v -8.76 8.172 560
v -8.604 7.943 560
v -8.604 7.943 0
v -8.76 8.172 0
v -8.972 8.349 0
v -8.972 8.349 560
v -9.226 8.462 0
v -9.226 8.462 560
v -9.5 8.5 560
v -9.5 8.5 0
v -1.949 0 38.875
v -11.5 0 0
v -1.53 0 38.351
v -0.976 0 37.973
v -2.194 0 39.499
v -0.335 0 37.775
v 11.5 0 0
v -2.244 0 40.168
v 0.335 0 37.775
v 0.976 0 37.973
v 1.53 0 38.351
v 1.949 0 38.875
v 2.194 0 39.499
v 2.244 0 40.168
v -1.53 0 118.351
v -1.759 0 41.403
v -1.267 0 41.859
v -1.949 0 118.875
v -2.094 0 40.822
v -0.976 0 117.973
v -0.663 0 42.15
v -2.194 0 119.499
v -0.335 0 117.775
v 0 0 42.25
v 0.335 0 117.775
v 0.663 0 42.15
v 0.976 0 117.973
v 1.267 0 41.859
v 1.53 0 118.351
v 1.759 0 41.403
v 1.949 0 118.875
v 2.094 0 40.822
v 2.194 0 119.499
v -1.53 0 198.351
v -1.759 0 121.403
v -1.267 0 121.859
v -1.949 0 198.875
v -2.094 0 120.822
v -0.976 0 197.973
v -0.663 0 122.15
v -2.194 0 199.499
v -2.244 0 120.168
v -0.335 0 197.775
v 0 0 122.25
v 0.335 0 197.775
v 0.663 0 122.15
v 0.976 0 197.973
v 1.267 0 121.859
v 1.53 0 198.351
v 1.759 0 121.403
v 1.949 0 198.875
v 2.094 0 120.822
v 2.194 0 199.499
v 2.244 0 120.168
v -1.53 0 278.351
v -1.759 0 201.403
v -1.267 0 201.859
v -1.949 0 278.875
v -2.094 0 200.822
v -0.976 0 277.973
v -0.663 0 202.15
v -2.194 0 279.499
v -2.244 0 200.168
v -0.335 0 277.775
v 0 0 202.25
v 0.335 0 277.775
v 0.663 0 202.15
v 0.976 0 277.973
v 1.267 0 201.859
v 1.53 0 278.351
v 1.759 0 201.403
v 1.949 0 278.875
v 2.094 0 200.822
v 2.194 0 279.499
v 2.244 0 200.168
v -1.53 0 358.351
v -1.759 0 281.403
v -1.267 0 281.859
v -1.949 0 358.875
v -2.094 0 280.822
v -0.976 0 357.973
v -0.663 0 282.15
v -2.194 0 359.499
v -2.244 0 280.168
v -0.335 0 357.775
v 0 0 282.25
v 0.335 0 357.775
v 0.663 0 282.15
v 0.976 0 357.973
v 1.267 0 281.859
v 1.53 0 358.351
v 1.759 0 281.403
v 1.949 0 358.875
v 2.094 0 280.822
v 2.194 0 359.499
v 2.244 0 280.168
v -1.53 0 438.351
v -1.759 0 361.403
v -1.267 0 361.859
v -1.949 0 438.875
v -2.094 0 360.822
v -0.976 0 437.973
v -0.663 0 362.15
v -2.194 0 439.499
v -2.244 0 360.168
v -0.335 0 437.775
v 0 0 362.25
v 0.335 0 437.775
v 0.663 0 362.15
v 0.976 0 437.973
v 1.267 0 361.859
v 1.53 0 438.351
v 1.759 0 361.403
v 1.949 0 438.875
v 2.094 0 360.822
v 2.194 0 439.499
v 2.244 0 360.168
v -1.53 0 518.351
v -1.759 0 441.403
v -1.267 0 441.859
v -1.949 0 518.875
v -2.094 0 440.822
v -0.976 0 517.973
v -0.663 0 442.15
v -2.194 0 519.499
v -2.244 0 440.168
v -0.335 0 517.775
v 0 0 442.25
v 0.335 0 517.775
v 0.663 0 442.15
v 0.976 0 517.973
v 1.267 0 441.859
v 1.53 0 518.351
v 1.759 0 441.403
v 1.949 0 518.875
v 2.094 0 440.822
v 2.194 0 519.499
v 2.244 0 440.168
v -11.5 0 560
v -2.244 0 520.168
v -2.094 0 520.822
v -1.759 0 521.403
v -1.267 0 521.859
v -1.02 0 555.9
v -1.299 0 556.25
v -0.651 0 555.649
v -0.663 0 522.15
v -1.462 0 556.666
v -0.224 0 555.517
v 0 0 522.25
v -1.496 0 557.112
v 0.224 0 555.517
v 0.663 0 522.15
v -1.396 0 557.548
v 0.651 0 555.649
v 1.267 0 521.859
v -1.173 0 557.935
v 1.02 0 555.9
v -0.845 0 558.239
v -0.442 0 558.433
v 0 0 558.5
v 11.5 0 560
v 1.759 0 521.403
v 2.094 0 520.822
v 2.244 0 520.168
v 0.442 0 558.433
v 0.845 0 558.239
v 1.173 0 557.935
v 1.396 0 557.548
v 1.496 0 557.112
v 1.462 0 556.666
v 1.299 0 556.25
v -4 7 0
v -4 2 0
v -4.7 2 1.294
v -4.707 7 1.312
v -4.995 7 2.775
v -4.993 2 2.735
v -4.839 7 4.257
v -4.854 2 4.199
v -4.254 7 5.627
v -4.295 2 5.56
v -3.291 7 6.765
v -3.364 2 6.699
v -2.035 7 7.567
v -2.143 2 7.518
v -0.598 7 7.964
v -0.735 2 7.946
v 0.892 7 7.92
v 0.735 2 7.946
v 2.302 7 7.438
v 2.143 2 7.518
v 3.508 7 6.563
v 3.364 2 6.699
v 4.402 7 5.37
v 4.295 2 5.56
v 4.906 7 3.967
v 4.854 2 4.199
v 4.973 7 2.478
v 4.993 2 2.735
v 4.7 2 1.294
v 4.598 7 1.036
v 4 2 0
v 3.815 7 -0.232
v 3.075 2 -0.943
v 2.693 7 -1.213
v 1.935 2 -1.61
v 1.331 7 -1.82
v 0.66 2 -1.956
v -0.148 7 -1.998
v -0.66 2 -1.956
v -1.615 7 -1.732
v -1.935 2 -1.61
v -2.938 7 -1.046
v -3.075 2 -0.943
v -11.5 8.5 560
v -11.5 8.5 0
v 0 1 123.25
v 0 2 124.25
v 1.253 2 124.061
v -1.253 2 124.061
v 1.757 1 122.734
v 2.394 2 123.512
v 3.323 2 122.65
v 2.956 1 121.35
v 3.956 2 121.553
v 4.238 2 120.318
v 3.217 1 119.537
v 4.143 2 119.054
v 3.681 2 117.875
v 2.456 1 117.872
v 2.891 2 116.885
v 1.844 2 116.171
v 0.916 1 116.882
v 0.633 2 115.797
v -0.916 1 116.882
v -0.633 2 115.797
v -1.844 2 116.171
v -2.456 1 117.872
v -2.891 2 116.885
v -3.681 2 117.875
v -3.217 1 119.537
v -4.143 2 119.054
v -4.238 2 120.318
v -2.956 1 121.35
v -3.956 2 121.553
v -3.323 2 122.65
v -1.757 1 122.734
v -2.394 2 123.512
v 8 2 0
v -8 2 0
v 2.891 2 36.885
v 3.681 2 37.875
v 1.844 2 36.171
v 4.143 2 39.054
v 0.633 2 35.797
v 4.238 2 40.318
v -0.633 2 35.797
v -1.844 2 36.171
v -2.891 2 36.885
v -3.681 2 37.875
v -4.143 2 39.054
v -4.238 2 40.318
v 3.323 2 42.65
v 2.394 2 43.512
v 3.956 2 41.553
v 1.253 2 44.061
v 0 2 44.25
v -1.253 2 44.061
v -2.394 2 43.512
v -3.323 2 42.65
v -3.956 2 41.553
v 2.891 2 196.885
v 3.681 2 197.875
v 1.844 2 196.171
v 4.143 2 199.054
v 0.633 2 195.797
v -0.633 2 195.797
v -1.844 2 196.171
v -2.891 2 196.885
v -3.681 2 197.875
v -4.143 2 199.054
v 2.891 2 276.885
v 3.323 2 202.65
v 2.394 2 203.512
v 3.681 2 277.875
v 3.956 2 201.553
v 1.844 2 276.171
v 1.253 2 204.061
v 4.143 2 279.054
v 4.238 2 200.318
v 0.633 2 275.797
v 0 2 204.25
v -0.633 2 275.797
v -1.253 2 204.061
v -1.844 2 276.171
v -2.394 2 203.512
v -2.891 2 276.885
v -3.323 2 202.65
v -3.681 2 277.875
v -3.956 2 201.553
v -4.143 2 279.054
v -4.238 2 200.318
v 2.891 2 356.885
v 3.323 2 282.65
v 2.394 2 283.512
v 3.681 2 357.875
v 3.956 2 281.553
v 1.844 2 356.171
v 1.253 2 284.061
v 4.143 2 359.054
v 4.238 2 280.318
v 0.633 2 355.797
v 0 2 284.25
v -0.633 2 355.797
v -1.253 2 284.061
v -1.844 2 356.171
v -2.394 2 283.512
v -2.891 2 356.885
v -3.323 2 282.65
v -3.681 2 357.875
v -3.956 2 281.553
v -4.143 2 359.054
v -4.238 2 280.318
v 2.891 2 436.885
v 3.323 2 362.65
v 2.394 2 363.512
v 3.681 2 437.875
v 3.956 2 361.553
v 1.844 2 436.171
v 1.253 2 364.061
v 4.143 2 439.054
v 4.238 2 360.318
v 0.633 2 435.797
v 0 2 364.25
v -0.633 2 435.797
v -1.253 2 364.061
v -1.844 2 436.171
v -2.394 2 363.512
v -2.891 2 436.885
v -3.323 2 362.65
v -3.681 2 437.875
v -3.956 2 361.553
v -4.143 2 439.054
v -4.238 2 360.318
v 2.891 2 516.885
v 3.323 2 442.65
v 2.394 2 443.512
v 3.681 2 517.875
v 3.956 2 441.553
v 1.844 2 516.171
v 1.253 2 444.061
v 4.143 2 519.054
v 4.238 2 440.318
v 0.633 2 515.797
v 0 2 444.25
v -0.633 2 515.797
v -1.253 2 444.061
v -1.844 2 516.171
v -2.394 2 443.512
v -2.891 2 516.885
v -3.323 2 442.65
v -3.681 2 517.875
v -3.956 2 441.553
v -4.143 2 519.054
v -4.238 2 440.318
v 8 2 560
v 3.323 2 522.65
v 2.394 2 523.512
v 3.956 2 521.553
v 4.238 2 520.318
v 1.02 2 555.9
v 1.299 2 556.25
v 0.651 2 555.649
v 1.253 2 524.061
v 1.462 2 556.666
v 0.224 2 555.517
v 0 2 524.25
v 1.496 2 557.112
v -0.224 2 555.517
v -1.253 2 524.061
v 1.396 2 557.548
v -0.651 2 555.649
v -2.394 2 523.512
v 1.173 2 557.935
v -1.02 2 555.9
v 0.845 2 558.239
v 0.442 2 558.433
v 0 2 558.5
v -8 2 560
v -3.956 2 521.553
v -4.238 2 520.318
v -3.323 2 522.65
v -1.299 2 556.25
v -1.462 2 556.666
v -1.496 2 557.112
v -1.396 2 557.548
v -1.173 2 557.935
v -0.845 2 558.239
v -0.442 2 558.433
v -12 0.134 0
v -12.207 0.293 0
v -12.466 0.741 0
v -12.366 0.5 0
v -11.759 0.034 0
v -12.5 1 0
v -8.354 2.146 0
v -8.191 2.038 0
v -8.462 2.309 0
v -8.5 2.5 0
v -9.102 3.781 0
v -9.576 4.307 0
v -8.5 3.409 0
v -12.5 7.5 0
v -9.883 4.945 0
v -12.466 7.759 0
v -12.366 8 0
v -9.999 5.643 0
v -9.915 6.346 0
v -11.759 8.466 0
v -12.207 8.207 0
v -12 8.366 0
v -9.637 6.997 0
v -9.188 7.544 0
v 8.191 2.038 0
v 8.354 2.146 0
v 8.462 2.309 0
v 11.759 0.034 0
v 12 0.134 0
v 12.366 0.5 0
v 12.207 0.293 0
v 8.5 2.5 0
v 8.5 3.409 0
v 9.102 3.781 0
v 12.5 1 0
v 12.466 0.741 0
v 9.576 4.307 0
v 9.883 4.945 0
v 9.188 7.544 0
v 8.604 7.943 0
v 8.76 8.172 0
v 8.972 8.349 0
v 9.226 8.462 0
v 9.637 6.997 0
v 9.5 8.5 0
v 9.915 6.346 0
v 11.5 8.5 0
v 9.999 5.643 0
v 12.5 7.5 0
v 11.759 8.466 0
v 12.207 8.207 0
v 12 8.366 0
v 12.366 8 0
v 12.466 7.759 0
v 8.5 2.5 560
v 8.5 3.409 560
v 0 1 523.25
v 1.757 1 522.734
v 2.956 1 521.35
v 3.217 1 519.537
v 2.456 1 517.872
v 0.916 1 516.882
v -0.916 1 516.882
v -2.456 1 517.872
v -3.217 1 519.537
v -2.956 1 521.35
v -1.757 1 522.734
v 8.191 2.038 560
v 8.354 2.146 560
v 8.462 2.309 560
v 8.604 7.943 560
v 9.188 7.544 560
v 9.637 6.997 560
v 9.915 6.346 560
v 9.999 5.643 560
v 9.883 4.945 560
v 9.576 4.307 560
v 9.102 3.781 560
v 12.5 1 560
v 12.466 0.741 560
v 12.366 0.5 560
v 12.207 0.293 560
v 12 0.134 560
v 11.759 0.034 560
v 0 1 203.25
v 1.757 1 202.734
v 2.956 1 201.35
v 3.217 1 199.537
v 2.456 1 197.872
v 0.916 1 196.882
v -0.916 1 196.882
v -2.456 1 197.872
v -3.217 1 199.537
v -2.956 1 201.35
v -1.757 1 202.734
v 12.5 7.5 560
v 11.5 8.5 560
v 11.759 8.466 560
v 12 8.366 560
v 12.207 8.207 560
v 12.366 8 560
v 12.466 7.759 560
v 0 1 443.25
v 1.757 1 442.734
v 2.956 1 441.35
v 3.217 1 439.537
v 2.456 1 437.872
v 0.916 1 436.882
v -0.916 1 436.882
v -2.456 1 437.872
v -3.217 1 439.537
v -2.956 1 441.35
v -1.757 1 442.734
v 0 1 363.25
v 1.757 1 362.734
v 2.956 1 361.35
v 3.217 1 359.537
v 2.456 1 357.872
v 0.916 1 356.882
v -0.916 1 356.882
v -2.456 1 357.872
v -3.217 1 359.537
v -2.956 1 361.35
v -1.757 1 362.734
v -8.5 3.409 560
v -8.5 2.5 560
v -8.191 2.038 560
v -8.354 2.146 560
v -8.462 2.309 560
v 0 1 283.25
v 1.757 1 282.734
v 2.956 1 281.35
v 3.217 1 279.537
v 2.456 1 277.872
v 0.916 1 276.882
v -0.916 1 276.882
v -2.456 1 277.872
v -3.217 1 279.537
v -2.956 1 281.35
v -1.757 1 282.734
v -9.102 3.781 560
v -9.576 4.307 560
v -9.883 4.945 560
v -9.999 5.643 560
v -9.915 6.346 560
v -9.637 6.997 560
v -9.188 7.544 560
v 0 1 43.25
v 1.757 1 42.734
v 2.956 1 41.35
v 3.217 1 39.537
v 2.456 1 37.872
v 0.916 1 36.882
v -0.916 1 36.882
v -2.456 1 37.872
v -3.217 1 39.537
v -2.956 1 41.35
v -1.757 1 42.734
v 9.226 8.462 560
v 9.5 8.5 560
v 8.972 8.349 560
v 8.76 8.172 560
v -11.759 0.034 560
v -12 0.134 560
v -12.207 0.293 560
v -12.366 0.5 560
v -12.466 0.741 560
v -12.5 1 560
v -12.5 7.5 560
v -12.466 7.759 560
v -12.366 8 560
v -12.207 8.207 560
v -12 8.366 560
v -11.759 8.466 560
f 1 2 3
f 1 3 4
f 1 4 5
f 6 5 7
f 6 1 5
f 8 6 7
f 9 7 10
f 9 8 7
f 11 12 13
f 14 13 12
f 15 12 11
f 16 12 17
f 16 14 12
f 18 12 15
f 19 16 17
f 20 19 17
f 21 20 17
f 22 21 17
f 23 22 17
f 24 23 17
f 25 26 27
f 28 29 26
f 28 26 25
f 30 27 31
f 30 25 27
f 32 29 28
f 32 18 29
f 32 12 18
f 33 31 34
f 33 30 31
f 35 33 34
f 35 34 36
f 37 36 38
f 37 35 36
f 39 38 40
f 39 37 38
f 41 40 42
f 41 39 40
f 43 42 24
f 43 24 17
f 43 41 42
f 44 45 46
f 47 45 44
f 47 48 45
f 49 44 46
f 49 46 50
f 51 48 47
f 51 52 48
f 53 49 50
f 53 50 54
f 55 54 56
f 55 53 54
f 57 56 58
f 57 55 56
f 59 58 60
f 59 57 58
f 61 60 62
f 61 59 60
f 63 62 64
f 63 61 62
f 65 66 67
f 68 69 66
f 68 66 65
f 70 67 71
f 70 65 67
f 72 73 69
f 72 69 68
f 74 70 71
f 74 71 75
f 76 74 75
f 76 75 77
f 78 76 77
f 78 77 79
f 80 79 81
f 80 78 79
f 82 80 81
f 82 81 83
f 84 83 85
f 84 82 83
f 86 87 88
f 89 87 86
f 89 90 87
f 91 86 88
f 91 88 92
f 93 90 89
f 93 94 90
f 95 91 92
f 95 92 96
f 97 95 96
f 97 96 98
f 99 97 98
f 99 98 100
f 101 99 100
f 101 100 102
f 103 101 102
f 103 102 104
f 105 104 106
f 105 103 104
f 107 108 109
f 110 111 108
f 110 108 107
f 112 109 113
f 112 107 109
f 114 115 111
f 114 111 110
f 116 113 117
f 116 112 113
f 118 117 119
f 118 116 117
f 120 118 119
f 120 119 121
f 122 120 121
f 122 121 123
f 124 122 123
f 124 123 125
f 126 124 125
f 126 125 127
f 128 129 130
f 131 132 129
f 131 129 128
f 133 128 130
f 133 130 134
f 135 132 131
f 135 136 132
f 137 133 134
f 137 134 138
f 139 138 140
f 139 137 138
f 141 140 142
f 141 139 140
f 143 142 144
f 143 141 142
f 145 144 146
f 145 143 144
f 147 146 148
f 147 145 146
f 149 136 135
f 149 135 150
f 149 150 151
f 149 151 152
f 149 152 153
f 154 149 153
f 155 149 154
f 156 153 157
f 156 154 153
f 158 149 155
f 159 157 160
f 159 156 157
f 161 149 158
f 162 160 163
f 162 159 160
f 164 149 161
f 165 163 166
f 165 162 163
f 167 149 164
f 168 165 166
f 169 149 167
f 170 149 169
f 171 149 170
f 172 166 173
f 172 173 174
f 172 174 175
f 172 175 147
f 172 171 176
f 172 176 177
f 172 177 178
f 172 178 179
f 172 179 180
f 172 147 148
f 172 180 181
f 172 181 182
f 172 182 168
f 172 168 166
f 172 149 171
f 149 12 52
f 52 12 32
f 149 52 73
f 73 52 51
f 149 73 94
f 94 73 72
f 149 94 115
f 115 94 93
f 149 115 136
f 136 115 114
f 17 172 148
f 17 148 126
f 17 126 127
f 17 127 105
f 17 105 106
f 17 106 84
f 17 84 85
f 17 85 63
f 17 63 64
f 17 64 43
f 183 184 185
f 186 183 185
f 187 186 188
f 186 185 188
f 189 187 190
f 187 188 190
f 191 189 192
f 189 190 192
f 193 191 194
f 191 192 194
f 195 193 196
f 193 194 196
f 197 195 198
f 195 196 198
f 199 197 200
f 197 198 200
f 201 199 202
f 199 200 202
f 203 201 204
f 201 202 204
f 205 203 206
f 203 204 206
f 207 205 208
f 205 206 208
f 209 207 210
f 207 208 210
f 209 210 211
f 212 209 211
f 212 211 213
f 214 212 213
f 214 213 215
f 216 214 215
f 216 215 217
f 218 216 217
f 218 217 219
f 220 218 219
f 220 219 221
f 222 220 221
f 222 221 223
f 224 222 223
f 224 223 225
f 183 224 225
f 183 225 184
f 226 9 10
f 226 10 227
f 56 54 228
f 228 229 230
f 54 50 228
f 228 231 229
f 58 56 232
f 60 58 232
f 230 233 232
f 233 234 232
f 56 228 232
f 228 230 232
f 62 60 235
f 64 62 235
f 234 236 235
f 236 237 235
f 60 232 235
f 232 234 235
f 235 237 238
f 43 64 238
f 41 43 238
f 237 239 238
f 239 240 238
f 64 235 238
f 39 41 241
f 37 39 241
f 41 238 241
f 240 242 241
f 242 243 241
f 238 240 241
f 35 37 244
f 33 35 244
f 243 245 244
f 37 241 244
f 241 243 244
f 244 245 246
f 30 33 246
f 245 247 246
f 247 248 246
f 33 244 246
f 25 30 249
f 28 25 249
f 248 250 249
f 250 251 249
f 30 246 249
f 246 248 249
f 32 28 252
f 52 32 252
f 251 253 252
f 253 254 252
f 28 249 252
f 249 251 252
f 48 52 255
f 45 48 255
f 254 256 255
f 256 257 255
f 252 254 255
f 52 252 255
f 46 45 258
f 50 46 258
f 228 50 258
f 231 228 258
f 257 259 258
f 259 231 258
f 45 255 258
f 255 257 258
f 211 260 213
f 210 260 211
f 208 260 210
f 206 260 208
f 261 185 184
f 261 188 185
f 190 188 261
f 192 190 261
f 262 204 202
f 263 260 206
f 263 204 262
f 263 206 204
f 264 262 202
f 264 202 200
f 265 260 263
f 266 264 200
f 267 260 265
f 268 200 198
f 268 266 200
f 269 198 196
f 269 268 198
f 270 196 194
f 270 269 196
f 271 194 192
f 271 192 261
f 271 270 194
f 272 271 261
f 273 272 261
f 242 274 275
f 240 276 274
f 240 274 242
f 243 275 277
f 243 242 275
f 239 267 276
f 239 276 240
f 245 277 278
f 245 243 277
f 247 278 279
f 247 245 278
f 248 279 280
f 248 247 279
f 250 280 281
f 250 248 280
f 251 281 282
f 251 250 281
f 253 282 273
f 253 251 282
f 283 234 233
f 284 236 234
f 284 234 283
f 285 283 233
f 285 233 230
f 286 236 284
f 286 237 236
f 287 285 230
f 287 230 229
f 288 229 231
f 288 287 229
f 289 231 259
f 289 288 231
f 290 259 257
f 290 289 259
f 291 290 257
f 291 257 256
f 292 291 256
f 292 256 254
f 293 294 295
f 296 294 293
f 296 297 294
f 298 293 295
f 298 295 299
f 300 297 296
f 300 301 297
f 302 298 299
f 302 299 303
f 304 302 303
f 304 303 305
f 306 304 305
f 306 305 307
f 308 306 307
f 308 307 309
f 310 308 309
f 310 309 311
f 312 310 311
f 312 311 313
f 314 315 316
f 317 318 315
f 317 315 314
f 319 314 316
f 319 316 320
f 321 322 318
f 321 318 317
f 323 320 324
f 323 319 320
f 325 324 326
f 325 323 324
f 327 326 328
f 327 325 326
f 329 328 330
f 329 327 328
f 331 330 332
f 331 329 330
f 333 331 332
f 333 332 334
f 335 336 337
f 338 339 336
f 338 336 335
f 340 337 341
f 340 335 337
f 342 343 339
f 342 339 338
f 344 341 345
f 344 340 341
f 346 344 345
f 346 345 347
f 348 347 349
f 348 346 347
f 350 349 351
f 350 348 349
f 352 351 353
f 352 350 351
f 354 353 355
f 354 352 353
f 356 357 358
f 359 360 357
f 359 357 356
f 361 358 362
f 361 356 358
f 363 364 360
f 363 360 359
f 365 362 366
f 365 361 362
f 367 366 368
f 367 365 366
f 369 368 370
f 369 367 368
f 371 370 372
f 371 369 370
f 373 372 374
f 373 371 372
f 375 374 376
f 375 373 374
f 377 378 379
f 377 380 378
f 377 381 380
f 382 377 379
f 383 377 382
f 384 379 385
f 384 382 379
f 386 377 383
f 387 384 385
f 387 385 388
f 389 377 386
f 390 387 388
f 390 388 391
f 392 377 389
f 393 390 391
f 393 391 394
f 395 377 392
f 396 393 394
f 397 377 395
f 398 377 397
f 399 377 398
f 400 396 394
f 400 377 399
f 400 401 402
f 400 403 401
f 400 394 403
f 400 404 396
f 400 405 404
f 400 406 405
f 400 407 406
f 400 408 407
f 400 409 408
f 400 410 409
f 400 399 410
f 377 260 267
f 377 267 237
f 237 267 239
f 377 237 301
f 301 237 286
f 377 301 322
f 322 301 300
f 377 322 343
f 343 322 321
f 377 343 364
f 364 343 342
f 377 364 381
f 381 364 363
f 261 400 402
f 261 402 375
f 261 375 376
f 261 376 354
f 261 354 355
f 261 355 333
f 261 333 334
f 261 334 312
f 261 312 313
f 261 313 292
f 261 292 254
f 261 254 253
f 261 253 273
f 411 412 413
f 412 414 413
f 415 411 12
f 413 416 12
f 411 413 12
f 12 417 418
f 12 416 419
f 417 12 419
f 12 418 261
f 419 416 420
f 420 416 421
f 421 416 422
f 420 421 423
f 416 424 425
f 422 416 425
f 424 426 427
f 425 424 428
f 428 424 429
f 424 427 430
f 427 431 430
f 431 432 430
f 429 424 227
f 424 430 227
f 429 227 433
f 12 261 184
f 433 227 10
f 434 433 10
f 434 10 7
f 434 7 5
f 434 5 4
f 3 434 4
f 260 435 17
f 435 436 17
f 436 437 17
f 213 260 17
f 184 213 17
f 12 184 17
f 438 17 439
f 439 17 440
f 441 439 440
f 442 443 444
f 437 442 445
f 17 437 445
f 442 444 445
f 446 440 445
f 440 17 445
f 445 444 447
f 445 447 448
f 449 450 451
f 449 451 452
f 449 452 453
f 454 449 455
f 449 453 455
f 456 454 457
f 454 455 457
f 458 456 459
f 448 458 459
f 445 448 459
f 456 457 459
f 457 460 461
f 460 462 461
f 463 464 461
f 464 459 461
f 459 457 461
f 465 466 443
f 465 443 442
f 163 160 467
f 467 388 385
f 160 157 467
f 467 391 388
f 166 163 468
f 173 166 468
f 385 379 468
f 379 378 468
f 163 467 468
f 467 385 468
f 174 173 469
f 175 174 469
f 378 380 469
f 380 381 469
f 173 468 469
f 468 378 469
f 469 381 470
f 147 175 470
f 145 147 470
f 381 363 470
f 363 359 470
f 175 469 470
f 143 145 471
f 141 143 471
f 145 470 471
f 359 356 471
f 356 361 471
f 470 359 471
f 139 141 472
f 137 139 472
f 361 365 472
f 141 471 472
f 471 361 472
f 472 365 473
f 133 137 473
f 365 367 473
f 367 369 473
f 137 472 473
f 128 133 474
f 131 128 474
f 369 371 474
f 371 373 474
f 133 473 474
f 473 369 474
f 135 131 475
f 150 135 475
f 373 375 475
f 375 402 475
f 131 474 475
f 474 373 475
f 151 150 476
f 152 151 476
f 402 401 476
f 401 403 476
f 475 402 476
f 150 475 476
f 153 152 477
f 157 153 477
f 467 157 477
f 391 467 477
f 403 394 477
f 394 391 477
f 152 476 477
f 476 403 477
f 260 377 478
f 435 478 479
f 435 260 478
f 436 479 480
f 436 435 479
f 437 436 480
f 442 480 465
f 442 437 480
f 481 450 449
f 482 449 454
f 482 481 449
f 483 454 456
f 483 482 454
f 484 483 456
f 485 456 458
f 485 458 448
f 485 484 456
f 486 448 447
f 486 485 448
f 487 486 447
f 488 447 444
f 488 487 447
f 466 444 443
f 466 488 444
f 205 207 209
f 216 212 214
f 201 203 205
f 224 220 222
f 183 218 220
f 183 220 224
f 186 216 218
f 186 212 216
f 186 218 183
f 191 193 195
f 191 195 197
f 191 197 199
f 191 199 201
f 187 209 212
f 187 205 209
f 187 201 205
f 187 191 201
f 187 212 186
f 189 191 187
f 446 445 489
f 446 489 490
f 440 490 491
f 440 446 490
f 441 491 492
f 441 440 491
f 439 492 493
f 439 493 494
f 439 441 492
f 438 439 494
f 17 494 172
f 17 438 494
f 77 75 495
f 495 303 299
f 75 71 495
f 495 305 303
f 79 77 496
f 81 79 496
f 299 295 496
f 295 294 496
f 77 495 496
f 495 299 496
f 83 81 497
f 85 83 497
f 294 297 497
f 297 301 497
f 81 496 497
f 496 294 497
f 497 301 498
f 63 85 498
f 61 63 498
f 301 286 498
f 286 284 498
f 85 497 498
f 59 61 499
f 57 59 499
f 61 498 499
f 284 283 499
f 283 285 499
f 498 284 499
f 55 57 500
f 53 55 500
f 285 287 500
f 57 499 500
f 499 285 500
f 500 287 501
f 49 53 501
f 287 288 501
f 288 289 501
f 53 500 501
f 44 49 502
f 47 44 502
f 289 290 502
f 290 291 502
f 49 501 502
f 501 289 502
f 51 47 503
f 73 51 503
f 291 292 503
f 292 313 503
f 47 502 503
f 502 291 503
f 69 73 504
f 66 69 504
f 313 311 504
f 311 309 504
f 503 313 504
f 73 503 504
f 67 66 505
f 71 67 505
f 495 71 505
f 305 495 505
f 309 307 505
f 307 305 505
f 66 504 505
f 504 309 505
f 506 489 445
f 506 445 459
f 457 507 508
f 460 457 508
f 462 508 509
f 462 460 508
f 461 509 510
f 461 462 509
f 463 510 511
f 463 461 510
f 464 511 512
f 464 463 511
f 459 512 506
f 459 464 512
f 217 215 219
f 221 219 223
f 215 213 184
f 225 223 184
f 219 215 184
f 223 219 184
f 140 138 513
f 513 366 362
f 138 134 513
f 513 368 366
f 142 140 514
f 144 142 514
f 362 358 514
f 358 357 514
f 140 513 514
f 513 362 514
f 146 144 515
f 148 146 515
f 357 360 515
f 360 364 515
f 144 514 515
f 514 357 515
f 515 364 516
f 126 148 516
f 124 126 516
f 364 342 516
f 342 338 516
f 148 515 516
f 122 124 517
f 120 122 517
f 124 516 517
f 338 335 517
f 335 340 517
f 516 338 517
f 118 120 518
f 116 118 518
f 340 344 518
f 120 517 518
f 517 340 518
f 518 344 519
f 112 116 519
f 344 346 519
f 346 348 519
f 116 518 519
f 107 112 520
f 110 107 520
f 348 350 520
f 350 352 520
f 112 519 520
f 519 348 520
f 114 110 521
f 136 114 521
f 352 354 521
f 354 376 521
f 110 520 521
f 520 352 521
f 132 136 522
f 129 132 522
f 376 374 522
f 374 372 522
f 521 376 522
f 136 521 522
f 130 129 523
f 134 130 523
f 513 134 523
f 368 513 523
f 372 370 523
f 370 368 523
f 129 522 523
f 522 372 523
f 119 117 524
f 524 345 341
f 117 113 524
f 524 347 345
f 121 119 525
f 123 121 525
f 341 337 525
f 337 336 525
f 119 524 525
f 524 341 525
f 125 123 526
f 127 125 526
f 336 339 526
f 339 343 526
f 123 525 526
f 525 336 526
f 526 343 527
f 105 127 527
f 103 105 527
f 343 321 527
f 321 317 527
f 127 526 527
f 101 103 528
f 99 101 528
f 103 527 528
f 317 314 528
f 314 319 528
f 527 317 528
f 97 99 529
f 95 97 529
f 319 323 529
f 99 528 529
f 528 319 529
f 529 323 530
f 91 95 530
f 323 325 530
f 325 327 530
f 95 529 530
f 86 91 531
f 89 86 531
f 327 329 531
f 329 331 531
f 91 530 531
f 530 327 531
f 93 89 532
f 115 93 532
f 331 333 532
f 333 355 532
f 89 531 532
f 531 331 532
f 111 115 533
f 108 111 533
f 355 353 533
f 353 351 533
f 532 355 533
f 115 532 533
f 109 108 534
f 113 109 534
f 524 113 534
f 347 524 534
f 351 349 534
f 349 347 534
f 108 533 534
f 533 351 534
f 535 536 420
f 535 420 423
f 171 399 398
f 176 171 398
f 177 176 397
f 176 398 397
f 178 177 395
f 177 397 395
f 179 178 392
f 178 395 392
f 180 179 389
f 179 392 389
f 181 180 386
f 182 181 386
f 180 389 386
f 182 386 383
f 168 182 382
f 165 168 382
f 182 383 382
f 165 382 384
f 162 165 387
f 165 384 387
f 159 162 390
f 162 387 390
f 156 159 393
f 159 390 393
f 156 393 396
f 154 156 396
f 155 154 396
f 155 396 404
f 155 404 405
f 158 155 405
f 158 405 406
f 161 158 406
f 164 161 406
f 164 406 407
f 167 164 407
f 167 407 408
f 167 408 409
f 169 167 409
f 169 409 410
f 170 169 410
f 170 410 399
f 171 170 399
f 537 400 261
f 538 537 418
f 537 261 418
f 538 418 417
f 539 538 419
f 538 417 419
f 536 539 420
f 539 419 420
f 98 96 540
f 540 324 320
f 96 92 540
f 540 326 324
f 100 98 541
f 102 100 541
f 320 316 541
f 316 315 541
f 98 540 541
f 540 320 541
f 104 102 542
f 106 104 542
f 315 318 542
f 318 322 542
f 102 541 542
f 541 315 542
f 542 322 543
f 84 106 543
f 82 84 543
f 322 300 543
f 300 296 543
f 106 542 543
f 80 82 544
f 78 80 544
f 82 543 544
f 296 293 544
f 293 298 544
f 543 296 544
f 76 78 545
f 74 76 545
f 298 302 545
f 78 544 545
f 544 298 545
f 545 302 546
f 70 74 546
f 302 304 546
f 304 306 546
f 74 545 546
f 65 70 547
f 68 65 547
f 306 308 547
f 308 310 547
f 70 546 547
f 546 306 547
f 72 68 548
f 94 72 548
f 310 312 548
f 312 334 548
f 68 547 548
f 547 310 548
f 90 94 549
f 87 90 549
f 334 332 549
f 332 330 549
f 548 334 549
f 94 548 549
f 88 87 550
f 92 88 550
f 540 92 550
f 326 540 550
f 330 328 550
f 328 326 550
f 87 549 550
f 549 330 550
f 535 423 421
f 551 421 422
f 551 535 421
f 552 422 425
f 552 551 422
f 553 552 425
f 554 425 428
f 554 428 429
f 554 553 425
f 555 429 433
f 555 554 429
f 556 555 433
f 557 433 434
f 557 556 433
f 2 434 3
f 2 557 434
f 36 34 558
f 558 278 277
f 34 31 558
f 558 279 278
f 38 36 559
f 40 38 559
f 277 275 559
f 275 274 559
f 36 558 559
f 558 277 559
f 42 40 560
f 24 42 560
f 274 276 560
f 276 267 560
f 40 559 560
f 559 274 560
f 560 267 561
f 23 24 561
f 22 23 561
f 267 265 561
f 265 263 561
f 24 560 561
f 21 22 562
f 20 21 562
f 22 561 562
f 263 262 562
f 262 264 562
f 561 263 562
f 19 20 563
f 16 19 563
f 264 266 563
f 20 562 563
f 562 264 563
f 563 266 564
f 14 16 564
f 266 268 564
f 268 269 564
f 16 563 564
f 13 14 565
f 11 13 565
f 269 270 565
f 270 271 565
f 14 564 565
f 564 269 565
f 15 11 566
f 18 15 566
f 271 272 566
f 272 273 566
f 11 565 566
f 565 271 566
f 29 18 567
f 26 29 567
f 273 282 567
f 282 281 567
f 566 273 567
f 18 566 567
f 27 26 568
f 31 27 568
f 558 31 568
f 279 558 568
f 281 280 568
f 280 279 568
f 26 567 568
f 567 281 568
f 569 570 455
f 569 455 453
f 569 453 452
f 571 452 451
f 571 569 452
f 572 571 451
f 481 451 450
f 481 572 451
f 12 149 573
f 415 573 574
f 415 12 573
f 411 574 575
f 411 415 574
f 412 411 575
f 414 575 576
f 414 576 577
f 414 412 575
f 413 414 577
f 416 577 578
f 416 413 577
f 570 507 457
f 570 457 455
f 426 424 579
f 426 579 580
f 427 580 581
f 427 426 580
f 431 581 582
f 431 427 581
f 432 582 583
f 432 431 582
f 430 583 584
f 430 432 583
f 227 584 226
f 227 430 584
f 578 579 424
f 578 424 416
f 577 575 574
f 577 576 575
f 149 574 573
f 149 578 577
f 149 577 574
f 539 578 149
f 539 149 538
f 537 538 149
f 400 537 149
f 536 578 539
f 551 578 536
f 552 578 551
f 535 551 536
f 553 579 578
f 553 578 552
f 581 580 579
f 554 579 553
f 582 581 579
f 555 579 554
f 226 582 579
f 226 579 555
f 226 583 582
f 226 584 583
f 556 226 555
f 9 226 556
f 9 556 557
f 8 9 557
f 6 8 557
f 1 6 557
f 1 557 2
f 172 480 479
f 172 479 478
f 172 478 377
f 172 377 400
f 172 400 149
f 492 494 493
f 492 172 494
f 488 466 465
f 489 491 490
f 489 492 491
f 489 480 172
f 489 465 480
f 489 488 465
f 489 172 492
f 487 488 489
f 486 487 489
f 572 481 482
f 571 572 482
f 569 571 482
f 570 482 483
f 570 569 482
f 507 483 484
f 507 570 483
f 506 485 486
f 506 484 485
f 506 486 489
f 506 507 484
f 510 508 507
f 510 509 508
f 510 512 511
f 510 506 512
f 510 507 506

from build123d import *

# Parameters (mm, degrees)
EXTRUDE_1_DEPTH          = 720
SKETCH_3_R               = 5
EXTRUDE_3_DEPTH          = 5
HOLE_WIZARD_1_AT_2_COUNT = 2
HOLE_WIZARD_1_AT_2_PITCH = 640
HOLE_WIZARD_1_AT_3_COUNT = 2
HOLE_WIZARD_1_AT_3_PITCH = 560
HOLE_WIZARD_1_AT_4_COUNT = 2
HOLE_WIZARD_1_AT_4_PITCH = 480
HOLE_WIZARD_1_AT_5_COUNT = 2
HOLE_WIZARD_1_AT_5_PITCH = 400
HOLE_WIZARD_1_AT_6_COUNT = 2
HOLE_WIZARD_1_AT_6_PITCH = 320
HOLE_WIZARD_1_AT_7_COUNT = 2
HOLE_WIZARD_1_AT_7_PITCH = 240
HOLE_WIZARD_1_AT_8_COUNT = 2
HOLE_WIZARD_1_AT_8_PITCH = 160
HOLE_WIZARD_1_AT_9_COUNT = 2
HOLE_WIZARD_1_AT_9_PITCH = 80
FILLET_1_R               = 0.5
FILLET_2_R               = 1
SKETCH_6_W               = 28.389485075
SKETCH_6_H               = 8.5
CUT_EXTRUDE_1_DEPTH      = 160
SKETCH_7_R               = 1.5
CUT_EXTRUDE_2_DEPTH      = 561.177204106


with BuildPart() as part:
    # ｽｹｯﾁ1 → ﾎﾞｽ - 押し出し1 (new body)
    with BuildSketch(Plane.XY.offset(720)):
        with BuildLine():
            Line((8.5, 3.408712153), (8.5, 2))
            Line((8.5, 2), (-8.5, 2))
            Line((-8.5, 2), (-8.5, 3.408712153))
            ThreePointArc((-8.5, 3.408712153), (-9.999347871, 5.642901666), (-8.603592403, 7.943230663))
            ThreePointArc((-8.603592403, 7.943230663), (-8.97237829, 8.349479447), (-9.5, 8.5))
            Line((-9.5, 8.5), (-12.5, 8.5))
            Line((-12.5, 8.5), (-12.5, 0))
            Line((-12.5, 0), (12.5, 0))
            Line((12.5, 0), (12.5, 8.5))
            Line((12.5, 8.5), (9.5, 8.5))
            ThreePointArc((9.5, 8.5), (8.97237829, 8.349479447), (8.603592403, 7.943230663))
            ThreePointArc((8.603592403, 7.943230663), (9.999347871, 5.642901666), (8.5, 3.408712153))
        make_face()
    extrude(amount=-EXTRUDE_1_DEPTH)

    # ｽｹｯﾁ3 → ﾎﾞｽ - 押し出し3 (add)
    with BuildSketch(Plane(origin=(0, 2, 0), x_dir=(-1, 0, 0), z_dir=(0, 1, 0))):
        with Locations(Location((0, 3, 0), (0, 0, 323.130102354))):
            Circle(SKETCH_3_R)
    extrude(amount=EXTRUDE_3_DEPTH)

    # ｽｹｯﾁ4 → 穴1 (revolve, cut)
    with BuildSketch(Plane(origin=(0, 2, 40), x_dir=(0, 0, 1), z_dir=(1, 0, 0))):
        Polygon((0, 0), (0, 2), (2.25, 2), (4.25, 0), align=None)
    hole_wizard_1 = revolve(axis=Axis((0, -108, 40), (0, 1, 0)), mode=Mode.SUBTRACT)

    # 穴1 at 2: 穴1 ×2
    with Locations(*[(0, 0, i * HOLE_WIZARD_1_AT_2_PITCH) for i in range(1, HOLE_WIZARD_1_AT_2_COUNT)]):
        add(hole_wizard_1, mode=Mode.SUBTRACT)

    # 穴1 at 3: 穴1 ×2
    with Locations(*[(0, 0, i * HOLE_WIZARD_1_AT_3_PITCH) for i in range(1, HOLE_WIZARD_1_AT_3_COUNT)]):
        add(hole_wizard_1, mode=Mode.SUBTRACT)

    # 穴1 at 4: 穴1 ×2
    with Locations(*[(0, 0, i * HOLE_WIZARD_1_AT_4_PITCH) for i in range(1, HOLE_WIZARD_1_AT_4_COUNT)]):
        add(hole_wizard_1, mode=Mode.SUBTRACT)

    # 穴1 at 5: 穴1 ×2
    with Locations(*[(0, 0, i * HOLE_WIZARD_1_AT_5_PITCH) for i in range(1, HOLE_WIZARD_1_AT_5_COUNT)]):
        add(hole_wizard_1, mode=Mode.SUBTRACT)

    # 穴1 at 6: 穴1 ×2
    with Locations(*[(0, 0, i * HOLE_WIZARD_1_AT_6_PITCH) for i in range(1, HOLE_WIZARD_1_AT_6_COUNT)]):
        add(hole_wizard_1, mode=Mode.SUBTRACT)

    # 穴1 at 7: 穴1 ×2
    with Locations(*[(0, 0, i * HOLE_WIZARD_1_AT_7_PITCH) for i in range(1, HOLE_WIZARD_1_AT_7_COUNT)]):
        add(hole_wizard_1, mode=Mode.SUBTRACT)

    # 穴1 at 8: 穴1 ×2
    with Locations(*[(0, 0, i * HOLE_WIZARD_1_AT_8_PITCH) for i in range(1, HOLE_WIZARD_1_AT_8_COUNT)]):
        add(hole_wizard_1, mode=Mode.SUBTRACT)

    # 穴1 at 9: 穴1 ×2
    with Locations(*[(0, 0, i * HOLE_WIZARD_1_AT_9_PITCH) for i in range(1, HOLE_WIZARD_1_AT_9_COUNT)]):
        add(hole_wizard_1, mode=Mode.SUBTRACT)

    # ﾌｨﾚｯﾄ1
    fillet_1_edges = [part.edges().sort_by_distance(p)[0] for p in [
        (-8.5, 2, 360),
        (8.5, 2, 360),
    ]]
    fillet(fillet_1_edges, radius=FILLET_1_R)

    # ﾌｨﾚｯﾄ2
    fillet_2_edges = [part.edges().sort_by_distance(p)[0] for p in [
        (12.5, 8.5, 360),
        (12.5, 0, 360),
        (-12.5, 0, 360),
        (-12.5, 8.5, 360),
    ]]
    fillet(fillet_2_edges, radius=FILLET_2_R)

    # ｽｹｯﾁ6 → ｶｯﾄ - 押し出し1 (cut)
    with BuildSketch(Plane.XY.offset(720)):
        with Locations((-0.090556571, 4.25)):
            Rectangle(SKETCH_6_W, SKETCH_6_H)
    extrude(amount=-CUT_EXTRUDE_1_DEPTH, mode=Mode.SUBTRACT)

    # ｽｹｯﾁ7 → ｶｯﾄ - 押し出し2 (cut, through all)
    with BuildSketch(Plane(origin=(0, 2, 0), x_dir=(1, 0, 0), z_dir=(0, 1, 0))):
        with Locations(Location((0, -557, 0), (0, 0, 270))):
            Circle(SKETCH_7_R)
    extrude(amount=-CUT_EXTRUDE_2_DEPTH, mode=Mode.SUBTRACT)


solid = part.part
